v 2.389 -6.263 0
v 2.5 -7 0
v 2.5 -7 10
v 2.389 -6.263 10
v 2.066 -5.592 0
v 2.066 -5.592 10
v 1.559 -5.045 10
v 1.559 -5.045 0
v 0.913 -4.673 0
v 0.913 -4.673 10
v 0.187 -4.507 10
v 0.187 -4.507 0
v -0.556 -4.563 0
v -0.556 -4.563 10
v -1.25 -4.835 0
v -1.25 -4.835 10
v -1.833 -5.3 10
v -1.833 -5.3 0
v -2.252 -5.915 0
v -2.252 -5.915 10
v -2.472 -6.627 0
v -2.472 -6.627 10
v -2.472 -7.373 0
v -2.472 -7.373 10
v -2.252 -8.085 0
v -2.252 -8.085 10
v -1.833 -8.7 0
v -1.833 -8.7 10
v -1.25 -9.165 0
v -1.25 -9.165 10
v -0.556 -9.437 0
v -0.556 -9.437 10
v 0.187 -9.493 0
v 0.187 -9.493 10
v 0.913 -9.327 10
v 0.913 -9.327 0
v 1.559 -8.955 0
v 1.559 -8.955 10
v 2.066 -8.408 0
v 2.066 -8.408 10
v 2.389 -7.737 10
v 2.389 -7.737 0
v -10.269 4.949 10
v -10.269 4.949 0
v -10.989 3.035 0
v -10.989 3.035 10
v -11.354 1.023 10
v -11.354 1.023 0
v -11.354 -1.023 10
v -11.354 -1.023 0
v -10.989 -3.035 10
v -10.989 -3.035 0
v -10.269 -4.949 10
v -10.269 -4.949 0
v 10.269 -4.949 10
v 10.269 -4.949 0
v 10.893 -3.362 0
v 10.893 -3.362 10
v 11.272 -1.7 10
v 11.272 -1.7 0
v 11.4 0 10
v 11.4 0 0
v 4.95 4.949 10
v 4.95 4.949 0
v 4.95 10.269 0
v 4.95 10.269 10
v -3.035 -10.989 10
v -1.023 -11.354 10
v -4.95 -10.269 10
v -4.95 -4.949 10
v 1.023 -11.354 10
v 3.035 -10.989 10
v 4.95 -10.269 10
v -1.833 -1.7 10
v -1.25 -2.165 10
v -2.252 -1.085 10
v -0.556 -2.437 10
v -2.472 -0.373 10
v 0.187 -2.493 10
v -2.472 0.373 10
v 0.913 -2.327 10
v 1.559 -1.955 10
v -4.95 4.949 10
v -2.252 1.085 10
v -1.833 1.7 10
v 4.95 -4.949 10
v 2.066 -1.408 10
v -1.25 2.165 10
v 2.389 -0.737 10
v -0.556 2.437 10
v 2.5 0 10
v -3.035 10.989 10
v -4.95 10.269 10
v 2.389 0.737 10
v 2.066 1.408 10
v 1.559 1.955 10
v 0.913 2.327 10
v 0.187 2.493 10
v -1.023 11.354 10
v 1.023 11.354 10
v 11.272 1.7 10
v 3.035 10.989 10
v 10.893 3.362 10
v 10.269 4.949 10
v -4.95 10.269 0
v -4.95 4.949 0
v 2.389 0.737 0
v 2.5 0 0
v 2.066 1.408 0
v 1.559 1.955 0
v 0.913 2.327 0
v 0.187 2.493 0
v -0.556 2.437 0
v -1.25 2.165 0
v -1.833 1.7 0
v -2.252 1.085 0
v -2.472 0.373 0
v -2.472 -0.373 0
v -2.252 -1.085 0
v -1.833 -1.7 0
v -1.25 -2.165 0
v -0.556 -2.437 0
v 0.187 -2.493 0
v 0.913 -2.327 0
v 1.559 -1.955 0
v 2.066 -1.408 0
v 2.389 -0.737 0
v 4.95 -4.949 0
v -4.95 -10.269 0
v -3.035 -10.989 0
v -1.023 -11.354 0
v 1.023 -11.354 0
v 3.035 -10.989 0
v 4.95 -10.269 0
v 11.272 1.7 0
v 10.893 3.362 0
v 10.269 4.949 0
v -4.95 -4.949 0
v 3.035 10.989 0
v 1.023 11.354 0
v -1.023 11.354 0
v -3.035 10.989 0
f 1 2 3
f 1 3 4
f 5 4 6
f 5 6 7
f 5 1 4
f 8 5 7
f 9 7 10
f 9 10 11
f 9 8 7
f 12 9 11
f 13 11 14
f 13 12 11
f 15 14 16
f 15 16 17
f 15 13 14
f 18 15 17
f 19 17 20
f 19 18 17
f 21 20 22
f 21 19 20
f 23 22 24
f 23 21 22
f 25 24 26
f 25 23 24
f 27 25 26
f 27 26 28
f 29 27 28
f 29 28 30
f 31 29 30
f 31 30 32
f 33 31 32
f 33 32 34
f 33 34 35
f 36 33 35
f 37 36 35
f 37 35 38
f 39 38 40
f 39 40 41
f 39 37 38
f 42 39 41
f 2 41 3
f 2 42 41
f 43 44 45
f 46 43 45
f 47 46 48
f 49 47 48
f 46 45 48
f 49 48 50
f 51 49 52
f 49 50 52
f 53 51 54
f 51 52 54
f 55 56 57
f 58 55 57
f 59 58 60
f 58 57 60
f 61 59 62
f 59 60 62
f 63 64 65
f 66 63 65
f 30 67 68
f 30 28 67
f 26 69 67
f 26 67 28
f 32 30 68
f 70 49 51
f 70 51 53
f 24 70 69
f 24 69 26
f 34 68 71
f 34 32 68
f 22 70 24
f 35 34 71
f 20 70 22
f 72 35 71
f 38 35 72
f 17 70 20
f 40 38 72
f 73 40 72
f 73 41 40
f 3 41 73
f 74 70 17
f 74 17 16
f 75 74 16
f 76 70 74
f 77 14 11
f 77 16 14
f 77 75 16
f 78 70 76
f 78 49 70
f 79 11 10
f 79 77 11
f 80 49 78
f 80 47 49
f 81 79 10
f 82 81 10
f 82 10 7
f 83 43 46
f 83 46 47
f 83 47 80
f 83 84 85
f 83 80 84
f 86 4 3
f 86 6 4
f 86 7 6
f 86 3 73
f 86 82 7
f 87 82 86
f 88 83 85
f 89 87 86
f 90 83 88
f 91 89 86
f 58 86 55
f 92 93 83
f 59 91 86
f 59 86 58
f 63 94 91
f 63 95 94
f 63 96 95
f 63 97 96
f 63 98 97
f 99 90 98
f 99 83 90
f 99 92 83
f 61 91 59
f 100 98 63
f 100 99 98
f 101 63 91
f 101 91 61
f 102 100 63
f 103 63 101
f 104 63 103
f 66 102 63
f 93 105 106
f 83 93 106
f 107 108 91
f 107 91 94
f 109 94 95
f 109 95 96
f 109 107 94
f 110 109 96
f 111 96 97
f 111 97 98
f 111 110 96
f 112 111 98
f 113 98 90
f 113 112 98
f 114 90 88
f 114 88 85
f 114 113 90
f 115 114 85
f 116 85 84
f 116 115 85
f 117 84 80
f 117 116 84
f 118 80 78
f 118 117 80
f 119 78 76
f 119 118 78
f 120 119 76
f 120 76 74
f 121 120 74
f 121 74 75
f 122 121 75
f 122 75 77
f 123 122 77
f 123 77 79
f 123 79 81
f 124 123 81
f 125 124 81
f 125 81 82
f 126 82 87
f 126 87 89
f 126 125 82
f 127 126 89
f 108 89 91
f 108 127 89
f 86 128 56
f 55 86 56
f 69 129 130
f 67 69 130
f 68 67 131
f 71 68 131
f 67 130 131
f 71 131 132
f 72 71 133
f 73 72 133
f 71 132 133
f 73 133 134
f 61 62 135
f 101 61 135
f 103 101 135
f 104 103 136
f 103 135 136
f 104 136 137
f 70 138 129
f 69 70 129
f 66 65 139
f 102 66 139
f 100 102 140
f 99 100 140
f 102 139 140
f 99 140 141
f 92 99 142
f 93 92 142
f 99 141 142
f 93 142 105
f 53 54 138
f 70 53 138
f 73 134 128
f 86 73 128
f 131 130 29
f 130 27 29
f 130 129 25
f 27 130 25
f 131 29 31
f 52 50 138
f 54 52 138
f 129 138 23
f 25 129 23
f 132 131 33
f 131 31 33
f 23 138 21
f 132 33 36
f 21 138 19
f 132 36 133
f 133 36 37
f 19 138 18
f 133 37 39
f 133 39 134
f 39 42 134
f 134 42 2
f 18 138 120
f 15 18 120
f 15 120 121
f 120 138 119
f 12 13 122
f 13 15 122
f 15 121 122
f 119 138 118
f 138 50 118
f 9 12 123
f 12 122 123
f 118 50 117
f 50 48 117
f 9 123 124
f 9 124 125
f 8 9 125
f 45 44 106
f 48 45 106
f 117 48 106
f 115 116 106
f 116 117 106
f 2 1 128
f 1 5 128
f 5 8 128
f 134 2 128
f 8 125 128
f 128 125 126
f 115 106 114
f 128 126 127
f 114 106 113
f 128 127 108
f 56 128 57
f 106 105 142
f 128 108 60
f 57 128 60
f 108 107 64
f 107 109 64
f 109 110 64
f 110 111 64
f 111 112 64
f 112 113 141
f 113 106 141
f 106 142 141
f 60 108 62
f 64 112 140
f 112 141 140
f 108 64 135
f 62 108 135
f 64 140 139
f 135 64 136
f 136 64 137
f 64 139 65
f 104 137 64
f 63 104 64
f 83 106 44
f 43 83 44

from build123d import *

# Parameters (mm, degrees)
F0_R     = 2.5
F1_DEPTH = 10


with BuildPart() as f1:
    # F0 (on Top) → F1 (new body)
    with BuildSketch(Plane.XY):
        with BuildLine():
            ThreePointArc((10.269494, -4.949495), (11.11378, -2.538481), (11.4, 0))
            ThreePointArc((11.4, 0), (11.11378, 2.538481), (10.269494, 4.949495))
            Line((10.269494, 4.949495), (4.95, 4.949495))
            Line((4.95, 4.949495), (4.95, 10.26925))
            ThreePointArc((4.95, 10.26925), (0, 11.4), (-4.95, 10.26925))
            Line((-4.95, 10.26925), (-4.95, 4.949495))
            Line((-4.95, 4.949495), (-10.269494, 4.949495))
            ThreePointArc((-10.269494, 4.949495), (-11.4, 0), (-10.269494, -4.949495))
            Line((-10.269494, -4.949495), (-4.95, -4.949495))
            Line((-4.95, -4.949495), (-4.95, -10.26925))
            ThreePointArc((-4.95, -10.26925), (0, -11.4), (4.95, -10.26925))
            Line((4.95, -10.26925), (4.95, -4.949495))
            Line((4.95, -4.949495), (10.269494, -4.949495))
        make_face()
        with Locations((0, -7)):
            Circle(F0_R, mode=Mode.SUBTRACT)
        Circle(F0_R, mode=Mode.SUBTRACT)
    extrude(amount=F1_DEPTH)


solid = f1.part
